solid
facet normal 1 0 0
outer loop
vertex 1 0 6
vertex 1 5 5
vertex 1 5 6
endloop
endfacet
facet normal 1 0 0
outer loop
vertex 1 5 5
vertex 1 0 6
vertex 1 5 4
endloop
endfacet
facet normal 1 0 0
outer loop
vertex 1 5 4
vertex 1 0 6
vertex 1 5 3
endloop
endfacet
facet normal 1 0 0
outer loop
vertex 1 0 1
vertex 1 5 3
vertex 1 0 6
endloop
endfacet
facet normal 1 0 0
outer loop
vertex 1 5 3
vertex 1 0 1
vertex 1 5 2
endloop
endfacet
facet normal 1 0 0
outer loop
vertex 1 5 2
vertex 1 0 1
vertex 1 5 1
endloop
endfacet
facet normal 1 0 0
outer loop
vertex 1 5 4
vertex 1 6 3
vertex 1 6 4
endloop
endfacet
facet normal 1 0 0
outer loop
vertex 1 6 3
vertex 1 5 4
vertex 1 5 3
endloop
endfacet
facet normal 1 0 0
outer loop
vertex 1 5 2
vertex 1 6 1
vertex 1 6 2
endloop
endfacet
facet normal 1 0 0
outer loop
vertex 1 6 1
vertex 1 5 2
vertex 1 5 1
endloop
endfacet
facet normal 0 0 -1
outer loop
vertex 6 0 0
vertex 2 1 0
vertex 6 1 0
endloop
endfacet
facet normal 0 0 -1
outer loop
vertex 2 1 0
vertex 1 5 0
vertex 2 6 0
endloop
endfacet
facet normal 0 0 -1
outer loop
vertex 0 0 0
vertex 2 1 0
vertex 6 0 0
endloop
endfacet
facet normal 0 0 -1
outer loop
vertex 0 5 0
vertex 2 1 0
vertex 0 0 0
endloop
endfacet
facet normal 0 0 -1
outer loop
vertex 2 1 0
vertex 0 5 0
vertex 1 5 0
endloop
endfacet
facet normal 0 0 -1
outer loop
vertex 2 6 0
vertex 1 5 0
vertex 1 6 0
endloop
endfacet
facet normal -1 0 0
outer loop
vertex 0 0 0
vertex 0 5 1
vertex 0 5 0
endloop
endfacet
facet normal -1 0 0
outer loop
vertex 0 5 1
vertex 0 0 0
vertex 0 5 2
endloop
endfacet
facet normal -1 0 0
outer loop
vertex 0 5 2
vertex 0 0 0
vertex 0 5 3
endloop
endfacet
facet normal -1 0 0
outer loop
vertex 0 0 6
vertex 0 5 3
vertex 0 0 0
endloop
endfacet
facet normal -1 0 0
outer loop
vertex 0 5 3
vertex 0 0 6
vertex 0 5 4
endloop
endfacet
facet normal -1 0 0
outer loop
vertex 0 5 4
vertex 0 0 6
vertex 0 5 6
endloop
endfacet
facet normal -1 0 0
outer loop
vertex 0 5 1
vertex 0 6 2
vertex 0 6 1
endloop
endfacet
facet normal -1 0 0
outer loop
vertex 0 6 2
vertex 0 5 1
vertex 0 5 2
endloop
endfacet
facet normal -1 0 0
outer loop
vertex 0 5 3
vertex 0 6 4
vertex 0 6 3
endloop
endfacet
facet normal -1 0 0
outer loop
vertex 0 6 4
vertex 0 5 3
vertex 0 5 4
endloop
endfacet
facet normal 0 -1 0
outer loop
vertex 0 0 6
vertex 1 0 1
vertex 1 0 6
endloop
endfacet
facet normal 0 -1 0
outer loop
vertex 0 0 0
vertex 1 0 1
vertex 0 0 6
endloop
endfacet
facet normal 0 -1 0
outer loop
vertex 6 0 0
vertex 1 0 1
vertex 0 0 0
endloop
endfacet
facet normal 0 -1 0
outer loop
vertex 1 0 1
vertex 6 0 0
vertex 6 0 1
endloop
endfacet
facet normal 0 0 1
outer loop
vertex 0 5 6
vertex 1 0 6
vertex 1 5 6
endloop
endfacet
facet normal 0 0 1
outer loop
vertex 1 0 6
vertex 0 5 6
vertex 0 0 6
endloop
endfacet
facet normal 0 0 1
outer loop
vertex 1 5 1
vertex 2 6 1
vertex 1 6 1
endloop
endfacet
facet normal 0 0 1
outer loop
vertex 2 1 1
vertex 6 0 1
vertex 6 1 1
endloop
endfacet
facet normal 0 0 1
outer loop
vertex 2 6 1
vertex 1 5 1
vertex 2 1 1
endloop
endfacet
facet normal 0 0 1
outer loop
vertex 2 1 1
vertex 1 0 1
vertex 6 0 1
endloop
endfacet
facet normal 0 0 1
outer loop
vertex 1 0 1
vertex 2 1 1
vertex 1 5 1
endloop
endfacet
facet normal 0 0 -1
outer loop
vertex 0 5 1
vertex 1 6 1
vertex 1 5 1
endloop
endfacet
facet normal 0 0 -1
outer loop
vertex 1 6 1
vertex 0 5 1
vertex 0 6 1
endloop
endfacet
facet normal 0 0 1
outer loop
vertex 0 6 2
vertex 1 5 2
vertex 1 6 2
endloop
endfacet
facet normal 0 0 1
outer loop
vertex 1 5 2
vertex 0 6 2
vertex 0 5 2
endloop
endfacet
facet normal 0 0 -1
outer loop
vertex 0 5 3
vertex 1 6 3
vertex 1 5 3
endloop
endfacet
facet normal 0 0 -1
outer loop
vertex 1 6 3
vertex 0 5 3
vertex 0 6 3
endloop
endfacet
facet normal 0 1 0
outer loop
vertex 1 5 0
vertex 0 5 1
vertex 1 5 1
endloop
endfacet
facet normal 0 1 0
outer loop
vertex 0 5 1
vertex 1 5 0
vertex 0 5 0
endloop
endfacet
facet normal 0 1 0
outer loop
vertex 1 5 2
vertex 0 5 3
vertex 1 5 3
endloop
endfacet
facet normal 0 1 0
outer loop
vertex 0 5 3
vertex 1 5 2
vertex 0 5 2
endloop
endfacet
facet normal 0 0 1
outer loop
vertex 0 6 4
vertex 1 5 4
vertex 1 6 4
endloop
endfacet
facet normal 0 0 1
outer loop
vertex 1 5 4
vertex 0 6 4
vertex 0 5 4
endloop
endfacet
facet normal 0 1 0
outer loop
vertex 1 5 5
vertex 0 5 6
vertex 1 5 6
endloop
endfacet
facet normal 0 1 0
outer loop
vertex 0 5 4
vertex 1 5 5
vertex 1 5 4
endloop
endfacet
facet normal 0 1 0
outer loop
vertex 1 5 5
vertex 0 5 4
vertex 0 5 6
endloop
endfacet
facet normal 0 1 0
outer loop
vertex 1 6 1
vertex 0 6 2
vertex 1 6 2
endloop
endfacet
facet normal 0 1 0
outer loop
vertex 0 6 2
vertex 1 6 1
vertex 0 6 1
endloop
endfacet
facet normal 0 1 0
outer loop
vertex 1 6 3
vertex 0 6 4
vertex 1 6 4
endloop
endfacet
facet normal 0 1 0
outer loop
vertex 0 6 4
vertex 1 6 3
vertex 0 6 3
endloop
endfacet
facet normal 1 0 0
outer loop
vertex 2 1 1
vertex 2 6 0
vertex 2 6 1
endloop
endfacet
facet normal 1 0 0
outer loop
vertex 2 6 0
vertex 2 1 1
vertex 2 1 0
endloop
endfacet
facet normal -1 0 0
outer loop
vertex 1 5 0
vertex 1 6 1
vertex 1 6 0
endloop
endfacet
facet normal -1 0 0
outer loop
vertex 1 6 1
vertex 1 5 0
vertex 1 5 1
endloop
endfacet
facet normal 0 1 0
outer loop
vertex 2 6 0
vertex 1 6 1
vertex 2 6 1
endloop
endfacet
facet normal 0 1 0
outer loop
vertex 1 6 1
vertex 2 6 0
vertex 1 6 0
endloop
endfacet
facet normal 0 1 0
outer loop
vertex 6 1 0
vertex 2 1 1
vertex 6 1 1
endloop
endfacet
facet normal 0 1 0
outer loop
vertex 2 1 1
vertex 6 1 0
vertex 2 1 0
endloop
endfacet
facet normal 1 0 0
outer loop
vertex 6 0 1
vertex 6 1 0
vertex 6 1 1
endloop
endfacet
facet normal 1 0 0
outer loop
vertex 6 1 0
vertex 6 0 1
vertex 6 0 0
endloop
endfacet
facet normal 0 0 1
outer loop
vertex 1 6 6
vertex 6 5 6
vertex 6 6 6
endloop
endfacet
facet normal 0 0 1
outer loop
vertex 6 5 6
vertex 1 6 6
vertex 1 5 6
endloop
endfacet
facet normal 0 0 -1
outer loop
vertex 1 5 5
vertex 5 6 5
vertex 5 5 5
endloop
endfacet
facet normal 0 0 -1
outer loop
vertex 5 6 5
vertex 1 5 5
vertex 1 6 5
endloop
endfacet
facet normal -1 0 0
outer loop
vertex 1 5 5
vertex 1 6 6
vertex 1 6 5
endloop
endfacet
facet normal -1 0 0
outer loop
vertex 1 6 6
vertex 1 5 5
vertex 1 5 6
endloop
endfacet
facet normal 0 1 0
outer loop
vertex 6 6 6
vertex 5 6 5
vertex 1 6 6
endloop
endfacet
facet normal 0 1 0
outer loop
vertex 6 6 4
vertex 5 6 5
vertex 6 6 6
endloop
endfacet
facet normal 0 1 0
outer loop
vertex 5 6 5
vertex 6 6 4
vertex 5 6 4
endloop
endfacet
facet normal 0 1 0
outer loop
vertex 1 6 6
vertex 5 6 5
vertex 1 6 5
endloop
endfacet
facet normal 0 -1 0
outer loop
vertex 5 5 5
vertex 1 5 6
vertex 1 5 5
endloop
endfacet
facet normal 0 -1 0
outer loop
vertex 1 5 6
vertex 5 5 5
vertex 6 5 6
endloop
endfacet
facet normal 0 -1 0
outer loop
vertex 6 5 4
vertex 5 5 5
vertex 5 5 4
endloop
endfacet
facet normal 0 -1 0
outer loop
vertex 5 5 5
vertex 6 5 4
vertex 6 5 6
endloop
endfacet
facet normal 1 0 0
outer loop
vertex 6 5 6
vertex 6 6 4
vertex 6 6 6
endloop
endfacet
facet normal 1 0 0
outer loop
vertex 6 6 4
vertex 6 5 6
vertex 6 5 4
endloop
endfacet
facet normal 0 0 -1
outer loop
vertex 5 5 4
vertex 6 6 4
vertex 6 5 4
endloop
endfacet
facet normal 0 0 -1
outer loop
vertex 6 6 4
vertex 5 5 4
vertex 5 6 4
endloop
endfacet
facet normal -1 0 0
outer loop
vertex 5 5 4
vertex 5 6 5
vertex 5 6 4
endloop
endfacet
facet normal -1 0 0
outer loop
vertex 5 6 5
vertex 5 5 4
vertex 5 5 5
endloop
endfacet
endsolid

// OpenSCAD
union() {
    translate([0, 0, 0]) cube([1, 1, 1]);
    translate([0, 0, 1]) cube([1, 1, 1]);
    translate([0, 0, 2]) cube([1, 1, 1]);
    translate([0, 0, 3]) cube([1, 1, 1]);
    translate([0, 0, 4]) cube([1, 1, 1]);
    translate([0, 0, 5]) cube([1, 1, 1]);
    translate([0, 1, 0]) cube([1, 1, 1]);
    translate([0, 1, 1]) cube([1, 1, 1]);
    translate([0, 1, 2]) cube([1, 1, 1]);
    translate([0, 1, 3]) cube([1, 1, 1]);
    translate([0, 1, 4]) cube([1, 1, 1]);
    translate([0, 1, 5]) cube([1, 1, 1]);
    translate([0, 2, 0]) cube([1, 1, 1]);
    translate([0, 2, 1]) cube([1, 1, 1]);
    translate([0, 2, 2]) cube([1, 1, 1]);
    translate([0, 2, 3]) cube([1, 1, 1]);
    translate([0, 2, 4]) cube([1, 1, 1]);
    translate([0, 2, 5]) cube([1, 1, 1]);
    translate([0, 3, 0]) cube([1, 1, 1]);
    translate([0, 3, 1]) cube([1, 1, 1]);
    translate([0, 3, 2]) cube([1, 1, 1]);
    translate([0, 3, 3]) cube([1, 1, 1]);
    translate([0, 3, 4]) cube([1, 1, 1]);
    translate([0, 3, 5]) cube([1, 1, 1]);
    translate([0, 4, 0]) cube([1, 1, 1]);
    translate([0, 4, 1]) cube([1, 1, 1]);
    translate([0, 4, 2]) cube([1, 1, 1]);
    translate([0, 4, 3]) cube([1, 1, 1]);
    translate([0, 4, 4]) cube([1, 1, 1]);
    translate([0, 4, 5]) cube([1, 1, 1]);
    translate([0, 5, 1]) cube([1, 1, 1]);
    translate([0, 5, 3]) cube([1, 1, 1]);
    translate([1, 0, 0]) cube([1, 1, 1]);
    translate([1, 1, 0]) cube([1, 1, 1]);
    translate([1, 2, 0]) cube([1, 1, 1]);
    translate([1, 3, 0]) cube([1, 1, 1]);
    translate([1, 4, 0]) cube([1, 1, 1]);
    translate([1, 5, 0]) cube([1, 1, 1]);
    translate([2, 0, 0]) cube([1, 1, 1]);
    translate([3, 0, 0]) cube([1, 1, 1]);
    translate([4, 0, 0]) cube([1, 1, 1]);
    translate([5, 0, 0]) cube([1, 1, 1]);
    translate([1, 5, 5]) cube([1, 1, 1]);
    translate([2, 5, 5]) cube([1, 1, 1]);
    translate([3, 5, 5]) cube([1, 1, 1]);
    translate([4, 5, 5]) cube([1, 1, 1]);
    translate([5, 5, 5]) cube([1, 1, 1]);
    translate([5, 5, 4]) cube([1, 1, 1]);
}
